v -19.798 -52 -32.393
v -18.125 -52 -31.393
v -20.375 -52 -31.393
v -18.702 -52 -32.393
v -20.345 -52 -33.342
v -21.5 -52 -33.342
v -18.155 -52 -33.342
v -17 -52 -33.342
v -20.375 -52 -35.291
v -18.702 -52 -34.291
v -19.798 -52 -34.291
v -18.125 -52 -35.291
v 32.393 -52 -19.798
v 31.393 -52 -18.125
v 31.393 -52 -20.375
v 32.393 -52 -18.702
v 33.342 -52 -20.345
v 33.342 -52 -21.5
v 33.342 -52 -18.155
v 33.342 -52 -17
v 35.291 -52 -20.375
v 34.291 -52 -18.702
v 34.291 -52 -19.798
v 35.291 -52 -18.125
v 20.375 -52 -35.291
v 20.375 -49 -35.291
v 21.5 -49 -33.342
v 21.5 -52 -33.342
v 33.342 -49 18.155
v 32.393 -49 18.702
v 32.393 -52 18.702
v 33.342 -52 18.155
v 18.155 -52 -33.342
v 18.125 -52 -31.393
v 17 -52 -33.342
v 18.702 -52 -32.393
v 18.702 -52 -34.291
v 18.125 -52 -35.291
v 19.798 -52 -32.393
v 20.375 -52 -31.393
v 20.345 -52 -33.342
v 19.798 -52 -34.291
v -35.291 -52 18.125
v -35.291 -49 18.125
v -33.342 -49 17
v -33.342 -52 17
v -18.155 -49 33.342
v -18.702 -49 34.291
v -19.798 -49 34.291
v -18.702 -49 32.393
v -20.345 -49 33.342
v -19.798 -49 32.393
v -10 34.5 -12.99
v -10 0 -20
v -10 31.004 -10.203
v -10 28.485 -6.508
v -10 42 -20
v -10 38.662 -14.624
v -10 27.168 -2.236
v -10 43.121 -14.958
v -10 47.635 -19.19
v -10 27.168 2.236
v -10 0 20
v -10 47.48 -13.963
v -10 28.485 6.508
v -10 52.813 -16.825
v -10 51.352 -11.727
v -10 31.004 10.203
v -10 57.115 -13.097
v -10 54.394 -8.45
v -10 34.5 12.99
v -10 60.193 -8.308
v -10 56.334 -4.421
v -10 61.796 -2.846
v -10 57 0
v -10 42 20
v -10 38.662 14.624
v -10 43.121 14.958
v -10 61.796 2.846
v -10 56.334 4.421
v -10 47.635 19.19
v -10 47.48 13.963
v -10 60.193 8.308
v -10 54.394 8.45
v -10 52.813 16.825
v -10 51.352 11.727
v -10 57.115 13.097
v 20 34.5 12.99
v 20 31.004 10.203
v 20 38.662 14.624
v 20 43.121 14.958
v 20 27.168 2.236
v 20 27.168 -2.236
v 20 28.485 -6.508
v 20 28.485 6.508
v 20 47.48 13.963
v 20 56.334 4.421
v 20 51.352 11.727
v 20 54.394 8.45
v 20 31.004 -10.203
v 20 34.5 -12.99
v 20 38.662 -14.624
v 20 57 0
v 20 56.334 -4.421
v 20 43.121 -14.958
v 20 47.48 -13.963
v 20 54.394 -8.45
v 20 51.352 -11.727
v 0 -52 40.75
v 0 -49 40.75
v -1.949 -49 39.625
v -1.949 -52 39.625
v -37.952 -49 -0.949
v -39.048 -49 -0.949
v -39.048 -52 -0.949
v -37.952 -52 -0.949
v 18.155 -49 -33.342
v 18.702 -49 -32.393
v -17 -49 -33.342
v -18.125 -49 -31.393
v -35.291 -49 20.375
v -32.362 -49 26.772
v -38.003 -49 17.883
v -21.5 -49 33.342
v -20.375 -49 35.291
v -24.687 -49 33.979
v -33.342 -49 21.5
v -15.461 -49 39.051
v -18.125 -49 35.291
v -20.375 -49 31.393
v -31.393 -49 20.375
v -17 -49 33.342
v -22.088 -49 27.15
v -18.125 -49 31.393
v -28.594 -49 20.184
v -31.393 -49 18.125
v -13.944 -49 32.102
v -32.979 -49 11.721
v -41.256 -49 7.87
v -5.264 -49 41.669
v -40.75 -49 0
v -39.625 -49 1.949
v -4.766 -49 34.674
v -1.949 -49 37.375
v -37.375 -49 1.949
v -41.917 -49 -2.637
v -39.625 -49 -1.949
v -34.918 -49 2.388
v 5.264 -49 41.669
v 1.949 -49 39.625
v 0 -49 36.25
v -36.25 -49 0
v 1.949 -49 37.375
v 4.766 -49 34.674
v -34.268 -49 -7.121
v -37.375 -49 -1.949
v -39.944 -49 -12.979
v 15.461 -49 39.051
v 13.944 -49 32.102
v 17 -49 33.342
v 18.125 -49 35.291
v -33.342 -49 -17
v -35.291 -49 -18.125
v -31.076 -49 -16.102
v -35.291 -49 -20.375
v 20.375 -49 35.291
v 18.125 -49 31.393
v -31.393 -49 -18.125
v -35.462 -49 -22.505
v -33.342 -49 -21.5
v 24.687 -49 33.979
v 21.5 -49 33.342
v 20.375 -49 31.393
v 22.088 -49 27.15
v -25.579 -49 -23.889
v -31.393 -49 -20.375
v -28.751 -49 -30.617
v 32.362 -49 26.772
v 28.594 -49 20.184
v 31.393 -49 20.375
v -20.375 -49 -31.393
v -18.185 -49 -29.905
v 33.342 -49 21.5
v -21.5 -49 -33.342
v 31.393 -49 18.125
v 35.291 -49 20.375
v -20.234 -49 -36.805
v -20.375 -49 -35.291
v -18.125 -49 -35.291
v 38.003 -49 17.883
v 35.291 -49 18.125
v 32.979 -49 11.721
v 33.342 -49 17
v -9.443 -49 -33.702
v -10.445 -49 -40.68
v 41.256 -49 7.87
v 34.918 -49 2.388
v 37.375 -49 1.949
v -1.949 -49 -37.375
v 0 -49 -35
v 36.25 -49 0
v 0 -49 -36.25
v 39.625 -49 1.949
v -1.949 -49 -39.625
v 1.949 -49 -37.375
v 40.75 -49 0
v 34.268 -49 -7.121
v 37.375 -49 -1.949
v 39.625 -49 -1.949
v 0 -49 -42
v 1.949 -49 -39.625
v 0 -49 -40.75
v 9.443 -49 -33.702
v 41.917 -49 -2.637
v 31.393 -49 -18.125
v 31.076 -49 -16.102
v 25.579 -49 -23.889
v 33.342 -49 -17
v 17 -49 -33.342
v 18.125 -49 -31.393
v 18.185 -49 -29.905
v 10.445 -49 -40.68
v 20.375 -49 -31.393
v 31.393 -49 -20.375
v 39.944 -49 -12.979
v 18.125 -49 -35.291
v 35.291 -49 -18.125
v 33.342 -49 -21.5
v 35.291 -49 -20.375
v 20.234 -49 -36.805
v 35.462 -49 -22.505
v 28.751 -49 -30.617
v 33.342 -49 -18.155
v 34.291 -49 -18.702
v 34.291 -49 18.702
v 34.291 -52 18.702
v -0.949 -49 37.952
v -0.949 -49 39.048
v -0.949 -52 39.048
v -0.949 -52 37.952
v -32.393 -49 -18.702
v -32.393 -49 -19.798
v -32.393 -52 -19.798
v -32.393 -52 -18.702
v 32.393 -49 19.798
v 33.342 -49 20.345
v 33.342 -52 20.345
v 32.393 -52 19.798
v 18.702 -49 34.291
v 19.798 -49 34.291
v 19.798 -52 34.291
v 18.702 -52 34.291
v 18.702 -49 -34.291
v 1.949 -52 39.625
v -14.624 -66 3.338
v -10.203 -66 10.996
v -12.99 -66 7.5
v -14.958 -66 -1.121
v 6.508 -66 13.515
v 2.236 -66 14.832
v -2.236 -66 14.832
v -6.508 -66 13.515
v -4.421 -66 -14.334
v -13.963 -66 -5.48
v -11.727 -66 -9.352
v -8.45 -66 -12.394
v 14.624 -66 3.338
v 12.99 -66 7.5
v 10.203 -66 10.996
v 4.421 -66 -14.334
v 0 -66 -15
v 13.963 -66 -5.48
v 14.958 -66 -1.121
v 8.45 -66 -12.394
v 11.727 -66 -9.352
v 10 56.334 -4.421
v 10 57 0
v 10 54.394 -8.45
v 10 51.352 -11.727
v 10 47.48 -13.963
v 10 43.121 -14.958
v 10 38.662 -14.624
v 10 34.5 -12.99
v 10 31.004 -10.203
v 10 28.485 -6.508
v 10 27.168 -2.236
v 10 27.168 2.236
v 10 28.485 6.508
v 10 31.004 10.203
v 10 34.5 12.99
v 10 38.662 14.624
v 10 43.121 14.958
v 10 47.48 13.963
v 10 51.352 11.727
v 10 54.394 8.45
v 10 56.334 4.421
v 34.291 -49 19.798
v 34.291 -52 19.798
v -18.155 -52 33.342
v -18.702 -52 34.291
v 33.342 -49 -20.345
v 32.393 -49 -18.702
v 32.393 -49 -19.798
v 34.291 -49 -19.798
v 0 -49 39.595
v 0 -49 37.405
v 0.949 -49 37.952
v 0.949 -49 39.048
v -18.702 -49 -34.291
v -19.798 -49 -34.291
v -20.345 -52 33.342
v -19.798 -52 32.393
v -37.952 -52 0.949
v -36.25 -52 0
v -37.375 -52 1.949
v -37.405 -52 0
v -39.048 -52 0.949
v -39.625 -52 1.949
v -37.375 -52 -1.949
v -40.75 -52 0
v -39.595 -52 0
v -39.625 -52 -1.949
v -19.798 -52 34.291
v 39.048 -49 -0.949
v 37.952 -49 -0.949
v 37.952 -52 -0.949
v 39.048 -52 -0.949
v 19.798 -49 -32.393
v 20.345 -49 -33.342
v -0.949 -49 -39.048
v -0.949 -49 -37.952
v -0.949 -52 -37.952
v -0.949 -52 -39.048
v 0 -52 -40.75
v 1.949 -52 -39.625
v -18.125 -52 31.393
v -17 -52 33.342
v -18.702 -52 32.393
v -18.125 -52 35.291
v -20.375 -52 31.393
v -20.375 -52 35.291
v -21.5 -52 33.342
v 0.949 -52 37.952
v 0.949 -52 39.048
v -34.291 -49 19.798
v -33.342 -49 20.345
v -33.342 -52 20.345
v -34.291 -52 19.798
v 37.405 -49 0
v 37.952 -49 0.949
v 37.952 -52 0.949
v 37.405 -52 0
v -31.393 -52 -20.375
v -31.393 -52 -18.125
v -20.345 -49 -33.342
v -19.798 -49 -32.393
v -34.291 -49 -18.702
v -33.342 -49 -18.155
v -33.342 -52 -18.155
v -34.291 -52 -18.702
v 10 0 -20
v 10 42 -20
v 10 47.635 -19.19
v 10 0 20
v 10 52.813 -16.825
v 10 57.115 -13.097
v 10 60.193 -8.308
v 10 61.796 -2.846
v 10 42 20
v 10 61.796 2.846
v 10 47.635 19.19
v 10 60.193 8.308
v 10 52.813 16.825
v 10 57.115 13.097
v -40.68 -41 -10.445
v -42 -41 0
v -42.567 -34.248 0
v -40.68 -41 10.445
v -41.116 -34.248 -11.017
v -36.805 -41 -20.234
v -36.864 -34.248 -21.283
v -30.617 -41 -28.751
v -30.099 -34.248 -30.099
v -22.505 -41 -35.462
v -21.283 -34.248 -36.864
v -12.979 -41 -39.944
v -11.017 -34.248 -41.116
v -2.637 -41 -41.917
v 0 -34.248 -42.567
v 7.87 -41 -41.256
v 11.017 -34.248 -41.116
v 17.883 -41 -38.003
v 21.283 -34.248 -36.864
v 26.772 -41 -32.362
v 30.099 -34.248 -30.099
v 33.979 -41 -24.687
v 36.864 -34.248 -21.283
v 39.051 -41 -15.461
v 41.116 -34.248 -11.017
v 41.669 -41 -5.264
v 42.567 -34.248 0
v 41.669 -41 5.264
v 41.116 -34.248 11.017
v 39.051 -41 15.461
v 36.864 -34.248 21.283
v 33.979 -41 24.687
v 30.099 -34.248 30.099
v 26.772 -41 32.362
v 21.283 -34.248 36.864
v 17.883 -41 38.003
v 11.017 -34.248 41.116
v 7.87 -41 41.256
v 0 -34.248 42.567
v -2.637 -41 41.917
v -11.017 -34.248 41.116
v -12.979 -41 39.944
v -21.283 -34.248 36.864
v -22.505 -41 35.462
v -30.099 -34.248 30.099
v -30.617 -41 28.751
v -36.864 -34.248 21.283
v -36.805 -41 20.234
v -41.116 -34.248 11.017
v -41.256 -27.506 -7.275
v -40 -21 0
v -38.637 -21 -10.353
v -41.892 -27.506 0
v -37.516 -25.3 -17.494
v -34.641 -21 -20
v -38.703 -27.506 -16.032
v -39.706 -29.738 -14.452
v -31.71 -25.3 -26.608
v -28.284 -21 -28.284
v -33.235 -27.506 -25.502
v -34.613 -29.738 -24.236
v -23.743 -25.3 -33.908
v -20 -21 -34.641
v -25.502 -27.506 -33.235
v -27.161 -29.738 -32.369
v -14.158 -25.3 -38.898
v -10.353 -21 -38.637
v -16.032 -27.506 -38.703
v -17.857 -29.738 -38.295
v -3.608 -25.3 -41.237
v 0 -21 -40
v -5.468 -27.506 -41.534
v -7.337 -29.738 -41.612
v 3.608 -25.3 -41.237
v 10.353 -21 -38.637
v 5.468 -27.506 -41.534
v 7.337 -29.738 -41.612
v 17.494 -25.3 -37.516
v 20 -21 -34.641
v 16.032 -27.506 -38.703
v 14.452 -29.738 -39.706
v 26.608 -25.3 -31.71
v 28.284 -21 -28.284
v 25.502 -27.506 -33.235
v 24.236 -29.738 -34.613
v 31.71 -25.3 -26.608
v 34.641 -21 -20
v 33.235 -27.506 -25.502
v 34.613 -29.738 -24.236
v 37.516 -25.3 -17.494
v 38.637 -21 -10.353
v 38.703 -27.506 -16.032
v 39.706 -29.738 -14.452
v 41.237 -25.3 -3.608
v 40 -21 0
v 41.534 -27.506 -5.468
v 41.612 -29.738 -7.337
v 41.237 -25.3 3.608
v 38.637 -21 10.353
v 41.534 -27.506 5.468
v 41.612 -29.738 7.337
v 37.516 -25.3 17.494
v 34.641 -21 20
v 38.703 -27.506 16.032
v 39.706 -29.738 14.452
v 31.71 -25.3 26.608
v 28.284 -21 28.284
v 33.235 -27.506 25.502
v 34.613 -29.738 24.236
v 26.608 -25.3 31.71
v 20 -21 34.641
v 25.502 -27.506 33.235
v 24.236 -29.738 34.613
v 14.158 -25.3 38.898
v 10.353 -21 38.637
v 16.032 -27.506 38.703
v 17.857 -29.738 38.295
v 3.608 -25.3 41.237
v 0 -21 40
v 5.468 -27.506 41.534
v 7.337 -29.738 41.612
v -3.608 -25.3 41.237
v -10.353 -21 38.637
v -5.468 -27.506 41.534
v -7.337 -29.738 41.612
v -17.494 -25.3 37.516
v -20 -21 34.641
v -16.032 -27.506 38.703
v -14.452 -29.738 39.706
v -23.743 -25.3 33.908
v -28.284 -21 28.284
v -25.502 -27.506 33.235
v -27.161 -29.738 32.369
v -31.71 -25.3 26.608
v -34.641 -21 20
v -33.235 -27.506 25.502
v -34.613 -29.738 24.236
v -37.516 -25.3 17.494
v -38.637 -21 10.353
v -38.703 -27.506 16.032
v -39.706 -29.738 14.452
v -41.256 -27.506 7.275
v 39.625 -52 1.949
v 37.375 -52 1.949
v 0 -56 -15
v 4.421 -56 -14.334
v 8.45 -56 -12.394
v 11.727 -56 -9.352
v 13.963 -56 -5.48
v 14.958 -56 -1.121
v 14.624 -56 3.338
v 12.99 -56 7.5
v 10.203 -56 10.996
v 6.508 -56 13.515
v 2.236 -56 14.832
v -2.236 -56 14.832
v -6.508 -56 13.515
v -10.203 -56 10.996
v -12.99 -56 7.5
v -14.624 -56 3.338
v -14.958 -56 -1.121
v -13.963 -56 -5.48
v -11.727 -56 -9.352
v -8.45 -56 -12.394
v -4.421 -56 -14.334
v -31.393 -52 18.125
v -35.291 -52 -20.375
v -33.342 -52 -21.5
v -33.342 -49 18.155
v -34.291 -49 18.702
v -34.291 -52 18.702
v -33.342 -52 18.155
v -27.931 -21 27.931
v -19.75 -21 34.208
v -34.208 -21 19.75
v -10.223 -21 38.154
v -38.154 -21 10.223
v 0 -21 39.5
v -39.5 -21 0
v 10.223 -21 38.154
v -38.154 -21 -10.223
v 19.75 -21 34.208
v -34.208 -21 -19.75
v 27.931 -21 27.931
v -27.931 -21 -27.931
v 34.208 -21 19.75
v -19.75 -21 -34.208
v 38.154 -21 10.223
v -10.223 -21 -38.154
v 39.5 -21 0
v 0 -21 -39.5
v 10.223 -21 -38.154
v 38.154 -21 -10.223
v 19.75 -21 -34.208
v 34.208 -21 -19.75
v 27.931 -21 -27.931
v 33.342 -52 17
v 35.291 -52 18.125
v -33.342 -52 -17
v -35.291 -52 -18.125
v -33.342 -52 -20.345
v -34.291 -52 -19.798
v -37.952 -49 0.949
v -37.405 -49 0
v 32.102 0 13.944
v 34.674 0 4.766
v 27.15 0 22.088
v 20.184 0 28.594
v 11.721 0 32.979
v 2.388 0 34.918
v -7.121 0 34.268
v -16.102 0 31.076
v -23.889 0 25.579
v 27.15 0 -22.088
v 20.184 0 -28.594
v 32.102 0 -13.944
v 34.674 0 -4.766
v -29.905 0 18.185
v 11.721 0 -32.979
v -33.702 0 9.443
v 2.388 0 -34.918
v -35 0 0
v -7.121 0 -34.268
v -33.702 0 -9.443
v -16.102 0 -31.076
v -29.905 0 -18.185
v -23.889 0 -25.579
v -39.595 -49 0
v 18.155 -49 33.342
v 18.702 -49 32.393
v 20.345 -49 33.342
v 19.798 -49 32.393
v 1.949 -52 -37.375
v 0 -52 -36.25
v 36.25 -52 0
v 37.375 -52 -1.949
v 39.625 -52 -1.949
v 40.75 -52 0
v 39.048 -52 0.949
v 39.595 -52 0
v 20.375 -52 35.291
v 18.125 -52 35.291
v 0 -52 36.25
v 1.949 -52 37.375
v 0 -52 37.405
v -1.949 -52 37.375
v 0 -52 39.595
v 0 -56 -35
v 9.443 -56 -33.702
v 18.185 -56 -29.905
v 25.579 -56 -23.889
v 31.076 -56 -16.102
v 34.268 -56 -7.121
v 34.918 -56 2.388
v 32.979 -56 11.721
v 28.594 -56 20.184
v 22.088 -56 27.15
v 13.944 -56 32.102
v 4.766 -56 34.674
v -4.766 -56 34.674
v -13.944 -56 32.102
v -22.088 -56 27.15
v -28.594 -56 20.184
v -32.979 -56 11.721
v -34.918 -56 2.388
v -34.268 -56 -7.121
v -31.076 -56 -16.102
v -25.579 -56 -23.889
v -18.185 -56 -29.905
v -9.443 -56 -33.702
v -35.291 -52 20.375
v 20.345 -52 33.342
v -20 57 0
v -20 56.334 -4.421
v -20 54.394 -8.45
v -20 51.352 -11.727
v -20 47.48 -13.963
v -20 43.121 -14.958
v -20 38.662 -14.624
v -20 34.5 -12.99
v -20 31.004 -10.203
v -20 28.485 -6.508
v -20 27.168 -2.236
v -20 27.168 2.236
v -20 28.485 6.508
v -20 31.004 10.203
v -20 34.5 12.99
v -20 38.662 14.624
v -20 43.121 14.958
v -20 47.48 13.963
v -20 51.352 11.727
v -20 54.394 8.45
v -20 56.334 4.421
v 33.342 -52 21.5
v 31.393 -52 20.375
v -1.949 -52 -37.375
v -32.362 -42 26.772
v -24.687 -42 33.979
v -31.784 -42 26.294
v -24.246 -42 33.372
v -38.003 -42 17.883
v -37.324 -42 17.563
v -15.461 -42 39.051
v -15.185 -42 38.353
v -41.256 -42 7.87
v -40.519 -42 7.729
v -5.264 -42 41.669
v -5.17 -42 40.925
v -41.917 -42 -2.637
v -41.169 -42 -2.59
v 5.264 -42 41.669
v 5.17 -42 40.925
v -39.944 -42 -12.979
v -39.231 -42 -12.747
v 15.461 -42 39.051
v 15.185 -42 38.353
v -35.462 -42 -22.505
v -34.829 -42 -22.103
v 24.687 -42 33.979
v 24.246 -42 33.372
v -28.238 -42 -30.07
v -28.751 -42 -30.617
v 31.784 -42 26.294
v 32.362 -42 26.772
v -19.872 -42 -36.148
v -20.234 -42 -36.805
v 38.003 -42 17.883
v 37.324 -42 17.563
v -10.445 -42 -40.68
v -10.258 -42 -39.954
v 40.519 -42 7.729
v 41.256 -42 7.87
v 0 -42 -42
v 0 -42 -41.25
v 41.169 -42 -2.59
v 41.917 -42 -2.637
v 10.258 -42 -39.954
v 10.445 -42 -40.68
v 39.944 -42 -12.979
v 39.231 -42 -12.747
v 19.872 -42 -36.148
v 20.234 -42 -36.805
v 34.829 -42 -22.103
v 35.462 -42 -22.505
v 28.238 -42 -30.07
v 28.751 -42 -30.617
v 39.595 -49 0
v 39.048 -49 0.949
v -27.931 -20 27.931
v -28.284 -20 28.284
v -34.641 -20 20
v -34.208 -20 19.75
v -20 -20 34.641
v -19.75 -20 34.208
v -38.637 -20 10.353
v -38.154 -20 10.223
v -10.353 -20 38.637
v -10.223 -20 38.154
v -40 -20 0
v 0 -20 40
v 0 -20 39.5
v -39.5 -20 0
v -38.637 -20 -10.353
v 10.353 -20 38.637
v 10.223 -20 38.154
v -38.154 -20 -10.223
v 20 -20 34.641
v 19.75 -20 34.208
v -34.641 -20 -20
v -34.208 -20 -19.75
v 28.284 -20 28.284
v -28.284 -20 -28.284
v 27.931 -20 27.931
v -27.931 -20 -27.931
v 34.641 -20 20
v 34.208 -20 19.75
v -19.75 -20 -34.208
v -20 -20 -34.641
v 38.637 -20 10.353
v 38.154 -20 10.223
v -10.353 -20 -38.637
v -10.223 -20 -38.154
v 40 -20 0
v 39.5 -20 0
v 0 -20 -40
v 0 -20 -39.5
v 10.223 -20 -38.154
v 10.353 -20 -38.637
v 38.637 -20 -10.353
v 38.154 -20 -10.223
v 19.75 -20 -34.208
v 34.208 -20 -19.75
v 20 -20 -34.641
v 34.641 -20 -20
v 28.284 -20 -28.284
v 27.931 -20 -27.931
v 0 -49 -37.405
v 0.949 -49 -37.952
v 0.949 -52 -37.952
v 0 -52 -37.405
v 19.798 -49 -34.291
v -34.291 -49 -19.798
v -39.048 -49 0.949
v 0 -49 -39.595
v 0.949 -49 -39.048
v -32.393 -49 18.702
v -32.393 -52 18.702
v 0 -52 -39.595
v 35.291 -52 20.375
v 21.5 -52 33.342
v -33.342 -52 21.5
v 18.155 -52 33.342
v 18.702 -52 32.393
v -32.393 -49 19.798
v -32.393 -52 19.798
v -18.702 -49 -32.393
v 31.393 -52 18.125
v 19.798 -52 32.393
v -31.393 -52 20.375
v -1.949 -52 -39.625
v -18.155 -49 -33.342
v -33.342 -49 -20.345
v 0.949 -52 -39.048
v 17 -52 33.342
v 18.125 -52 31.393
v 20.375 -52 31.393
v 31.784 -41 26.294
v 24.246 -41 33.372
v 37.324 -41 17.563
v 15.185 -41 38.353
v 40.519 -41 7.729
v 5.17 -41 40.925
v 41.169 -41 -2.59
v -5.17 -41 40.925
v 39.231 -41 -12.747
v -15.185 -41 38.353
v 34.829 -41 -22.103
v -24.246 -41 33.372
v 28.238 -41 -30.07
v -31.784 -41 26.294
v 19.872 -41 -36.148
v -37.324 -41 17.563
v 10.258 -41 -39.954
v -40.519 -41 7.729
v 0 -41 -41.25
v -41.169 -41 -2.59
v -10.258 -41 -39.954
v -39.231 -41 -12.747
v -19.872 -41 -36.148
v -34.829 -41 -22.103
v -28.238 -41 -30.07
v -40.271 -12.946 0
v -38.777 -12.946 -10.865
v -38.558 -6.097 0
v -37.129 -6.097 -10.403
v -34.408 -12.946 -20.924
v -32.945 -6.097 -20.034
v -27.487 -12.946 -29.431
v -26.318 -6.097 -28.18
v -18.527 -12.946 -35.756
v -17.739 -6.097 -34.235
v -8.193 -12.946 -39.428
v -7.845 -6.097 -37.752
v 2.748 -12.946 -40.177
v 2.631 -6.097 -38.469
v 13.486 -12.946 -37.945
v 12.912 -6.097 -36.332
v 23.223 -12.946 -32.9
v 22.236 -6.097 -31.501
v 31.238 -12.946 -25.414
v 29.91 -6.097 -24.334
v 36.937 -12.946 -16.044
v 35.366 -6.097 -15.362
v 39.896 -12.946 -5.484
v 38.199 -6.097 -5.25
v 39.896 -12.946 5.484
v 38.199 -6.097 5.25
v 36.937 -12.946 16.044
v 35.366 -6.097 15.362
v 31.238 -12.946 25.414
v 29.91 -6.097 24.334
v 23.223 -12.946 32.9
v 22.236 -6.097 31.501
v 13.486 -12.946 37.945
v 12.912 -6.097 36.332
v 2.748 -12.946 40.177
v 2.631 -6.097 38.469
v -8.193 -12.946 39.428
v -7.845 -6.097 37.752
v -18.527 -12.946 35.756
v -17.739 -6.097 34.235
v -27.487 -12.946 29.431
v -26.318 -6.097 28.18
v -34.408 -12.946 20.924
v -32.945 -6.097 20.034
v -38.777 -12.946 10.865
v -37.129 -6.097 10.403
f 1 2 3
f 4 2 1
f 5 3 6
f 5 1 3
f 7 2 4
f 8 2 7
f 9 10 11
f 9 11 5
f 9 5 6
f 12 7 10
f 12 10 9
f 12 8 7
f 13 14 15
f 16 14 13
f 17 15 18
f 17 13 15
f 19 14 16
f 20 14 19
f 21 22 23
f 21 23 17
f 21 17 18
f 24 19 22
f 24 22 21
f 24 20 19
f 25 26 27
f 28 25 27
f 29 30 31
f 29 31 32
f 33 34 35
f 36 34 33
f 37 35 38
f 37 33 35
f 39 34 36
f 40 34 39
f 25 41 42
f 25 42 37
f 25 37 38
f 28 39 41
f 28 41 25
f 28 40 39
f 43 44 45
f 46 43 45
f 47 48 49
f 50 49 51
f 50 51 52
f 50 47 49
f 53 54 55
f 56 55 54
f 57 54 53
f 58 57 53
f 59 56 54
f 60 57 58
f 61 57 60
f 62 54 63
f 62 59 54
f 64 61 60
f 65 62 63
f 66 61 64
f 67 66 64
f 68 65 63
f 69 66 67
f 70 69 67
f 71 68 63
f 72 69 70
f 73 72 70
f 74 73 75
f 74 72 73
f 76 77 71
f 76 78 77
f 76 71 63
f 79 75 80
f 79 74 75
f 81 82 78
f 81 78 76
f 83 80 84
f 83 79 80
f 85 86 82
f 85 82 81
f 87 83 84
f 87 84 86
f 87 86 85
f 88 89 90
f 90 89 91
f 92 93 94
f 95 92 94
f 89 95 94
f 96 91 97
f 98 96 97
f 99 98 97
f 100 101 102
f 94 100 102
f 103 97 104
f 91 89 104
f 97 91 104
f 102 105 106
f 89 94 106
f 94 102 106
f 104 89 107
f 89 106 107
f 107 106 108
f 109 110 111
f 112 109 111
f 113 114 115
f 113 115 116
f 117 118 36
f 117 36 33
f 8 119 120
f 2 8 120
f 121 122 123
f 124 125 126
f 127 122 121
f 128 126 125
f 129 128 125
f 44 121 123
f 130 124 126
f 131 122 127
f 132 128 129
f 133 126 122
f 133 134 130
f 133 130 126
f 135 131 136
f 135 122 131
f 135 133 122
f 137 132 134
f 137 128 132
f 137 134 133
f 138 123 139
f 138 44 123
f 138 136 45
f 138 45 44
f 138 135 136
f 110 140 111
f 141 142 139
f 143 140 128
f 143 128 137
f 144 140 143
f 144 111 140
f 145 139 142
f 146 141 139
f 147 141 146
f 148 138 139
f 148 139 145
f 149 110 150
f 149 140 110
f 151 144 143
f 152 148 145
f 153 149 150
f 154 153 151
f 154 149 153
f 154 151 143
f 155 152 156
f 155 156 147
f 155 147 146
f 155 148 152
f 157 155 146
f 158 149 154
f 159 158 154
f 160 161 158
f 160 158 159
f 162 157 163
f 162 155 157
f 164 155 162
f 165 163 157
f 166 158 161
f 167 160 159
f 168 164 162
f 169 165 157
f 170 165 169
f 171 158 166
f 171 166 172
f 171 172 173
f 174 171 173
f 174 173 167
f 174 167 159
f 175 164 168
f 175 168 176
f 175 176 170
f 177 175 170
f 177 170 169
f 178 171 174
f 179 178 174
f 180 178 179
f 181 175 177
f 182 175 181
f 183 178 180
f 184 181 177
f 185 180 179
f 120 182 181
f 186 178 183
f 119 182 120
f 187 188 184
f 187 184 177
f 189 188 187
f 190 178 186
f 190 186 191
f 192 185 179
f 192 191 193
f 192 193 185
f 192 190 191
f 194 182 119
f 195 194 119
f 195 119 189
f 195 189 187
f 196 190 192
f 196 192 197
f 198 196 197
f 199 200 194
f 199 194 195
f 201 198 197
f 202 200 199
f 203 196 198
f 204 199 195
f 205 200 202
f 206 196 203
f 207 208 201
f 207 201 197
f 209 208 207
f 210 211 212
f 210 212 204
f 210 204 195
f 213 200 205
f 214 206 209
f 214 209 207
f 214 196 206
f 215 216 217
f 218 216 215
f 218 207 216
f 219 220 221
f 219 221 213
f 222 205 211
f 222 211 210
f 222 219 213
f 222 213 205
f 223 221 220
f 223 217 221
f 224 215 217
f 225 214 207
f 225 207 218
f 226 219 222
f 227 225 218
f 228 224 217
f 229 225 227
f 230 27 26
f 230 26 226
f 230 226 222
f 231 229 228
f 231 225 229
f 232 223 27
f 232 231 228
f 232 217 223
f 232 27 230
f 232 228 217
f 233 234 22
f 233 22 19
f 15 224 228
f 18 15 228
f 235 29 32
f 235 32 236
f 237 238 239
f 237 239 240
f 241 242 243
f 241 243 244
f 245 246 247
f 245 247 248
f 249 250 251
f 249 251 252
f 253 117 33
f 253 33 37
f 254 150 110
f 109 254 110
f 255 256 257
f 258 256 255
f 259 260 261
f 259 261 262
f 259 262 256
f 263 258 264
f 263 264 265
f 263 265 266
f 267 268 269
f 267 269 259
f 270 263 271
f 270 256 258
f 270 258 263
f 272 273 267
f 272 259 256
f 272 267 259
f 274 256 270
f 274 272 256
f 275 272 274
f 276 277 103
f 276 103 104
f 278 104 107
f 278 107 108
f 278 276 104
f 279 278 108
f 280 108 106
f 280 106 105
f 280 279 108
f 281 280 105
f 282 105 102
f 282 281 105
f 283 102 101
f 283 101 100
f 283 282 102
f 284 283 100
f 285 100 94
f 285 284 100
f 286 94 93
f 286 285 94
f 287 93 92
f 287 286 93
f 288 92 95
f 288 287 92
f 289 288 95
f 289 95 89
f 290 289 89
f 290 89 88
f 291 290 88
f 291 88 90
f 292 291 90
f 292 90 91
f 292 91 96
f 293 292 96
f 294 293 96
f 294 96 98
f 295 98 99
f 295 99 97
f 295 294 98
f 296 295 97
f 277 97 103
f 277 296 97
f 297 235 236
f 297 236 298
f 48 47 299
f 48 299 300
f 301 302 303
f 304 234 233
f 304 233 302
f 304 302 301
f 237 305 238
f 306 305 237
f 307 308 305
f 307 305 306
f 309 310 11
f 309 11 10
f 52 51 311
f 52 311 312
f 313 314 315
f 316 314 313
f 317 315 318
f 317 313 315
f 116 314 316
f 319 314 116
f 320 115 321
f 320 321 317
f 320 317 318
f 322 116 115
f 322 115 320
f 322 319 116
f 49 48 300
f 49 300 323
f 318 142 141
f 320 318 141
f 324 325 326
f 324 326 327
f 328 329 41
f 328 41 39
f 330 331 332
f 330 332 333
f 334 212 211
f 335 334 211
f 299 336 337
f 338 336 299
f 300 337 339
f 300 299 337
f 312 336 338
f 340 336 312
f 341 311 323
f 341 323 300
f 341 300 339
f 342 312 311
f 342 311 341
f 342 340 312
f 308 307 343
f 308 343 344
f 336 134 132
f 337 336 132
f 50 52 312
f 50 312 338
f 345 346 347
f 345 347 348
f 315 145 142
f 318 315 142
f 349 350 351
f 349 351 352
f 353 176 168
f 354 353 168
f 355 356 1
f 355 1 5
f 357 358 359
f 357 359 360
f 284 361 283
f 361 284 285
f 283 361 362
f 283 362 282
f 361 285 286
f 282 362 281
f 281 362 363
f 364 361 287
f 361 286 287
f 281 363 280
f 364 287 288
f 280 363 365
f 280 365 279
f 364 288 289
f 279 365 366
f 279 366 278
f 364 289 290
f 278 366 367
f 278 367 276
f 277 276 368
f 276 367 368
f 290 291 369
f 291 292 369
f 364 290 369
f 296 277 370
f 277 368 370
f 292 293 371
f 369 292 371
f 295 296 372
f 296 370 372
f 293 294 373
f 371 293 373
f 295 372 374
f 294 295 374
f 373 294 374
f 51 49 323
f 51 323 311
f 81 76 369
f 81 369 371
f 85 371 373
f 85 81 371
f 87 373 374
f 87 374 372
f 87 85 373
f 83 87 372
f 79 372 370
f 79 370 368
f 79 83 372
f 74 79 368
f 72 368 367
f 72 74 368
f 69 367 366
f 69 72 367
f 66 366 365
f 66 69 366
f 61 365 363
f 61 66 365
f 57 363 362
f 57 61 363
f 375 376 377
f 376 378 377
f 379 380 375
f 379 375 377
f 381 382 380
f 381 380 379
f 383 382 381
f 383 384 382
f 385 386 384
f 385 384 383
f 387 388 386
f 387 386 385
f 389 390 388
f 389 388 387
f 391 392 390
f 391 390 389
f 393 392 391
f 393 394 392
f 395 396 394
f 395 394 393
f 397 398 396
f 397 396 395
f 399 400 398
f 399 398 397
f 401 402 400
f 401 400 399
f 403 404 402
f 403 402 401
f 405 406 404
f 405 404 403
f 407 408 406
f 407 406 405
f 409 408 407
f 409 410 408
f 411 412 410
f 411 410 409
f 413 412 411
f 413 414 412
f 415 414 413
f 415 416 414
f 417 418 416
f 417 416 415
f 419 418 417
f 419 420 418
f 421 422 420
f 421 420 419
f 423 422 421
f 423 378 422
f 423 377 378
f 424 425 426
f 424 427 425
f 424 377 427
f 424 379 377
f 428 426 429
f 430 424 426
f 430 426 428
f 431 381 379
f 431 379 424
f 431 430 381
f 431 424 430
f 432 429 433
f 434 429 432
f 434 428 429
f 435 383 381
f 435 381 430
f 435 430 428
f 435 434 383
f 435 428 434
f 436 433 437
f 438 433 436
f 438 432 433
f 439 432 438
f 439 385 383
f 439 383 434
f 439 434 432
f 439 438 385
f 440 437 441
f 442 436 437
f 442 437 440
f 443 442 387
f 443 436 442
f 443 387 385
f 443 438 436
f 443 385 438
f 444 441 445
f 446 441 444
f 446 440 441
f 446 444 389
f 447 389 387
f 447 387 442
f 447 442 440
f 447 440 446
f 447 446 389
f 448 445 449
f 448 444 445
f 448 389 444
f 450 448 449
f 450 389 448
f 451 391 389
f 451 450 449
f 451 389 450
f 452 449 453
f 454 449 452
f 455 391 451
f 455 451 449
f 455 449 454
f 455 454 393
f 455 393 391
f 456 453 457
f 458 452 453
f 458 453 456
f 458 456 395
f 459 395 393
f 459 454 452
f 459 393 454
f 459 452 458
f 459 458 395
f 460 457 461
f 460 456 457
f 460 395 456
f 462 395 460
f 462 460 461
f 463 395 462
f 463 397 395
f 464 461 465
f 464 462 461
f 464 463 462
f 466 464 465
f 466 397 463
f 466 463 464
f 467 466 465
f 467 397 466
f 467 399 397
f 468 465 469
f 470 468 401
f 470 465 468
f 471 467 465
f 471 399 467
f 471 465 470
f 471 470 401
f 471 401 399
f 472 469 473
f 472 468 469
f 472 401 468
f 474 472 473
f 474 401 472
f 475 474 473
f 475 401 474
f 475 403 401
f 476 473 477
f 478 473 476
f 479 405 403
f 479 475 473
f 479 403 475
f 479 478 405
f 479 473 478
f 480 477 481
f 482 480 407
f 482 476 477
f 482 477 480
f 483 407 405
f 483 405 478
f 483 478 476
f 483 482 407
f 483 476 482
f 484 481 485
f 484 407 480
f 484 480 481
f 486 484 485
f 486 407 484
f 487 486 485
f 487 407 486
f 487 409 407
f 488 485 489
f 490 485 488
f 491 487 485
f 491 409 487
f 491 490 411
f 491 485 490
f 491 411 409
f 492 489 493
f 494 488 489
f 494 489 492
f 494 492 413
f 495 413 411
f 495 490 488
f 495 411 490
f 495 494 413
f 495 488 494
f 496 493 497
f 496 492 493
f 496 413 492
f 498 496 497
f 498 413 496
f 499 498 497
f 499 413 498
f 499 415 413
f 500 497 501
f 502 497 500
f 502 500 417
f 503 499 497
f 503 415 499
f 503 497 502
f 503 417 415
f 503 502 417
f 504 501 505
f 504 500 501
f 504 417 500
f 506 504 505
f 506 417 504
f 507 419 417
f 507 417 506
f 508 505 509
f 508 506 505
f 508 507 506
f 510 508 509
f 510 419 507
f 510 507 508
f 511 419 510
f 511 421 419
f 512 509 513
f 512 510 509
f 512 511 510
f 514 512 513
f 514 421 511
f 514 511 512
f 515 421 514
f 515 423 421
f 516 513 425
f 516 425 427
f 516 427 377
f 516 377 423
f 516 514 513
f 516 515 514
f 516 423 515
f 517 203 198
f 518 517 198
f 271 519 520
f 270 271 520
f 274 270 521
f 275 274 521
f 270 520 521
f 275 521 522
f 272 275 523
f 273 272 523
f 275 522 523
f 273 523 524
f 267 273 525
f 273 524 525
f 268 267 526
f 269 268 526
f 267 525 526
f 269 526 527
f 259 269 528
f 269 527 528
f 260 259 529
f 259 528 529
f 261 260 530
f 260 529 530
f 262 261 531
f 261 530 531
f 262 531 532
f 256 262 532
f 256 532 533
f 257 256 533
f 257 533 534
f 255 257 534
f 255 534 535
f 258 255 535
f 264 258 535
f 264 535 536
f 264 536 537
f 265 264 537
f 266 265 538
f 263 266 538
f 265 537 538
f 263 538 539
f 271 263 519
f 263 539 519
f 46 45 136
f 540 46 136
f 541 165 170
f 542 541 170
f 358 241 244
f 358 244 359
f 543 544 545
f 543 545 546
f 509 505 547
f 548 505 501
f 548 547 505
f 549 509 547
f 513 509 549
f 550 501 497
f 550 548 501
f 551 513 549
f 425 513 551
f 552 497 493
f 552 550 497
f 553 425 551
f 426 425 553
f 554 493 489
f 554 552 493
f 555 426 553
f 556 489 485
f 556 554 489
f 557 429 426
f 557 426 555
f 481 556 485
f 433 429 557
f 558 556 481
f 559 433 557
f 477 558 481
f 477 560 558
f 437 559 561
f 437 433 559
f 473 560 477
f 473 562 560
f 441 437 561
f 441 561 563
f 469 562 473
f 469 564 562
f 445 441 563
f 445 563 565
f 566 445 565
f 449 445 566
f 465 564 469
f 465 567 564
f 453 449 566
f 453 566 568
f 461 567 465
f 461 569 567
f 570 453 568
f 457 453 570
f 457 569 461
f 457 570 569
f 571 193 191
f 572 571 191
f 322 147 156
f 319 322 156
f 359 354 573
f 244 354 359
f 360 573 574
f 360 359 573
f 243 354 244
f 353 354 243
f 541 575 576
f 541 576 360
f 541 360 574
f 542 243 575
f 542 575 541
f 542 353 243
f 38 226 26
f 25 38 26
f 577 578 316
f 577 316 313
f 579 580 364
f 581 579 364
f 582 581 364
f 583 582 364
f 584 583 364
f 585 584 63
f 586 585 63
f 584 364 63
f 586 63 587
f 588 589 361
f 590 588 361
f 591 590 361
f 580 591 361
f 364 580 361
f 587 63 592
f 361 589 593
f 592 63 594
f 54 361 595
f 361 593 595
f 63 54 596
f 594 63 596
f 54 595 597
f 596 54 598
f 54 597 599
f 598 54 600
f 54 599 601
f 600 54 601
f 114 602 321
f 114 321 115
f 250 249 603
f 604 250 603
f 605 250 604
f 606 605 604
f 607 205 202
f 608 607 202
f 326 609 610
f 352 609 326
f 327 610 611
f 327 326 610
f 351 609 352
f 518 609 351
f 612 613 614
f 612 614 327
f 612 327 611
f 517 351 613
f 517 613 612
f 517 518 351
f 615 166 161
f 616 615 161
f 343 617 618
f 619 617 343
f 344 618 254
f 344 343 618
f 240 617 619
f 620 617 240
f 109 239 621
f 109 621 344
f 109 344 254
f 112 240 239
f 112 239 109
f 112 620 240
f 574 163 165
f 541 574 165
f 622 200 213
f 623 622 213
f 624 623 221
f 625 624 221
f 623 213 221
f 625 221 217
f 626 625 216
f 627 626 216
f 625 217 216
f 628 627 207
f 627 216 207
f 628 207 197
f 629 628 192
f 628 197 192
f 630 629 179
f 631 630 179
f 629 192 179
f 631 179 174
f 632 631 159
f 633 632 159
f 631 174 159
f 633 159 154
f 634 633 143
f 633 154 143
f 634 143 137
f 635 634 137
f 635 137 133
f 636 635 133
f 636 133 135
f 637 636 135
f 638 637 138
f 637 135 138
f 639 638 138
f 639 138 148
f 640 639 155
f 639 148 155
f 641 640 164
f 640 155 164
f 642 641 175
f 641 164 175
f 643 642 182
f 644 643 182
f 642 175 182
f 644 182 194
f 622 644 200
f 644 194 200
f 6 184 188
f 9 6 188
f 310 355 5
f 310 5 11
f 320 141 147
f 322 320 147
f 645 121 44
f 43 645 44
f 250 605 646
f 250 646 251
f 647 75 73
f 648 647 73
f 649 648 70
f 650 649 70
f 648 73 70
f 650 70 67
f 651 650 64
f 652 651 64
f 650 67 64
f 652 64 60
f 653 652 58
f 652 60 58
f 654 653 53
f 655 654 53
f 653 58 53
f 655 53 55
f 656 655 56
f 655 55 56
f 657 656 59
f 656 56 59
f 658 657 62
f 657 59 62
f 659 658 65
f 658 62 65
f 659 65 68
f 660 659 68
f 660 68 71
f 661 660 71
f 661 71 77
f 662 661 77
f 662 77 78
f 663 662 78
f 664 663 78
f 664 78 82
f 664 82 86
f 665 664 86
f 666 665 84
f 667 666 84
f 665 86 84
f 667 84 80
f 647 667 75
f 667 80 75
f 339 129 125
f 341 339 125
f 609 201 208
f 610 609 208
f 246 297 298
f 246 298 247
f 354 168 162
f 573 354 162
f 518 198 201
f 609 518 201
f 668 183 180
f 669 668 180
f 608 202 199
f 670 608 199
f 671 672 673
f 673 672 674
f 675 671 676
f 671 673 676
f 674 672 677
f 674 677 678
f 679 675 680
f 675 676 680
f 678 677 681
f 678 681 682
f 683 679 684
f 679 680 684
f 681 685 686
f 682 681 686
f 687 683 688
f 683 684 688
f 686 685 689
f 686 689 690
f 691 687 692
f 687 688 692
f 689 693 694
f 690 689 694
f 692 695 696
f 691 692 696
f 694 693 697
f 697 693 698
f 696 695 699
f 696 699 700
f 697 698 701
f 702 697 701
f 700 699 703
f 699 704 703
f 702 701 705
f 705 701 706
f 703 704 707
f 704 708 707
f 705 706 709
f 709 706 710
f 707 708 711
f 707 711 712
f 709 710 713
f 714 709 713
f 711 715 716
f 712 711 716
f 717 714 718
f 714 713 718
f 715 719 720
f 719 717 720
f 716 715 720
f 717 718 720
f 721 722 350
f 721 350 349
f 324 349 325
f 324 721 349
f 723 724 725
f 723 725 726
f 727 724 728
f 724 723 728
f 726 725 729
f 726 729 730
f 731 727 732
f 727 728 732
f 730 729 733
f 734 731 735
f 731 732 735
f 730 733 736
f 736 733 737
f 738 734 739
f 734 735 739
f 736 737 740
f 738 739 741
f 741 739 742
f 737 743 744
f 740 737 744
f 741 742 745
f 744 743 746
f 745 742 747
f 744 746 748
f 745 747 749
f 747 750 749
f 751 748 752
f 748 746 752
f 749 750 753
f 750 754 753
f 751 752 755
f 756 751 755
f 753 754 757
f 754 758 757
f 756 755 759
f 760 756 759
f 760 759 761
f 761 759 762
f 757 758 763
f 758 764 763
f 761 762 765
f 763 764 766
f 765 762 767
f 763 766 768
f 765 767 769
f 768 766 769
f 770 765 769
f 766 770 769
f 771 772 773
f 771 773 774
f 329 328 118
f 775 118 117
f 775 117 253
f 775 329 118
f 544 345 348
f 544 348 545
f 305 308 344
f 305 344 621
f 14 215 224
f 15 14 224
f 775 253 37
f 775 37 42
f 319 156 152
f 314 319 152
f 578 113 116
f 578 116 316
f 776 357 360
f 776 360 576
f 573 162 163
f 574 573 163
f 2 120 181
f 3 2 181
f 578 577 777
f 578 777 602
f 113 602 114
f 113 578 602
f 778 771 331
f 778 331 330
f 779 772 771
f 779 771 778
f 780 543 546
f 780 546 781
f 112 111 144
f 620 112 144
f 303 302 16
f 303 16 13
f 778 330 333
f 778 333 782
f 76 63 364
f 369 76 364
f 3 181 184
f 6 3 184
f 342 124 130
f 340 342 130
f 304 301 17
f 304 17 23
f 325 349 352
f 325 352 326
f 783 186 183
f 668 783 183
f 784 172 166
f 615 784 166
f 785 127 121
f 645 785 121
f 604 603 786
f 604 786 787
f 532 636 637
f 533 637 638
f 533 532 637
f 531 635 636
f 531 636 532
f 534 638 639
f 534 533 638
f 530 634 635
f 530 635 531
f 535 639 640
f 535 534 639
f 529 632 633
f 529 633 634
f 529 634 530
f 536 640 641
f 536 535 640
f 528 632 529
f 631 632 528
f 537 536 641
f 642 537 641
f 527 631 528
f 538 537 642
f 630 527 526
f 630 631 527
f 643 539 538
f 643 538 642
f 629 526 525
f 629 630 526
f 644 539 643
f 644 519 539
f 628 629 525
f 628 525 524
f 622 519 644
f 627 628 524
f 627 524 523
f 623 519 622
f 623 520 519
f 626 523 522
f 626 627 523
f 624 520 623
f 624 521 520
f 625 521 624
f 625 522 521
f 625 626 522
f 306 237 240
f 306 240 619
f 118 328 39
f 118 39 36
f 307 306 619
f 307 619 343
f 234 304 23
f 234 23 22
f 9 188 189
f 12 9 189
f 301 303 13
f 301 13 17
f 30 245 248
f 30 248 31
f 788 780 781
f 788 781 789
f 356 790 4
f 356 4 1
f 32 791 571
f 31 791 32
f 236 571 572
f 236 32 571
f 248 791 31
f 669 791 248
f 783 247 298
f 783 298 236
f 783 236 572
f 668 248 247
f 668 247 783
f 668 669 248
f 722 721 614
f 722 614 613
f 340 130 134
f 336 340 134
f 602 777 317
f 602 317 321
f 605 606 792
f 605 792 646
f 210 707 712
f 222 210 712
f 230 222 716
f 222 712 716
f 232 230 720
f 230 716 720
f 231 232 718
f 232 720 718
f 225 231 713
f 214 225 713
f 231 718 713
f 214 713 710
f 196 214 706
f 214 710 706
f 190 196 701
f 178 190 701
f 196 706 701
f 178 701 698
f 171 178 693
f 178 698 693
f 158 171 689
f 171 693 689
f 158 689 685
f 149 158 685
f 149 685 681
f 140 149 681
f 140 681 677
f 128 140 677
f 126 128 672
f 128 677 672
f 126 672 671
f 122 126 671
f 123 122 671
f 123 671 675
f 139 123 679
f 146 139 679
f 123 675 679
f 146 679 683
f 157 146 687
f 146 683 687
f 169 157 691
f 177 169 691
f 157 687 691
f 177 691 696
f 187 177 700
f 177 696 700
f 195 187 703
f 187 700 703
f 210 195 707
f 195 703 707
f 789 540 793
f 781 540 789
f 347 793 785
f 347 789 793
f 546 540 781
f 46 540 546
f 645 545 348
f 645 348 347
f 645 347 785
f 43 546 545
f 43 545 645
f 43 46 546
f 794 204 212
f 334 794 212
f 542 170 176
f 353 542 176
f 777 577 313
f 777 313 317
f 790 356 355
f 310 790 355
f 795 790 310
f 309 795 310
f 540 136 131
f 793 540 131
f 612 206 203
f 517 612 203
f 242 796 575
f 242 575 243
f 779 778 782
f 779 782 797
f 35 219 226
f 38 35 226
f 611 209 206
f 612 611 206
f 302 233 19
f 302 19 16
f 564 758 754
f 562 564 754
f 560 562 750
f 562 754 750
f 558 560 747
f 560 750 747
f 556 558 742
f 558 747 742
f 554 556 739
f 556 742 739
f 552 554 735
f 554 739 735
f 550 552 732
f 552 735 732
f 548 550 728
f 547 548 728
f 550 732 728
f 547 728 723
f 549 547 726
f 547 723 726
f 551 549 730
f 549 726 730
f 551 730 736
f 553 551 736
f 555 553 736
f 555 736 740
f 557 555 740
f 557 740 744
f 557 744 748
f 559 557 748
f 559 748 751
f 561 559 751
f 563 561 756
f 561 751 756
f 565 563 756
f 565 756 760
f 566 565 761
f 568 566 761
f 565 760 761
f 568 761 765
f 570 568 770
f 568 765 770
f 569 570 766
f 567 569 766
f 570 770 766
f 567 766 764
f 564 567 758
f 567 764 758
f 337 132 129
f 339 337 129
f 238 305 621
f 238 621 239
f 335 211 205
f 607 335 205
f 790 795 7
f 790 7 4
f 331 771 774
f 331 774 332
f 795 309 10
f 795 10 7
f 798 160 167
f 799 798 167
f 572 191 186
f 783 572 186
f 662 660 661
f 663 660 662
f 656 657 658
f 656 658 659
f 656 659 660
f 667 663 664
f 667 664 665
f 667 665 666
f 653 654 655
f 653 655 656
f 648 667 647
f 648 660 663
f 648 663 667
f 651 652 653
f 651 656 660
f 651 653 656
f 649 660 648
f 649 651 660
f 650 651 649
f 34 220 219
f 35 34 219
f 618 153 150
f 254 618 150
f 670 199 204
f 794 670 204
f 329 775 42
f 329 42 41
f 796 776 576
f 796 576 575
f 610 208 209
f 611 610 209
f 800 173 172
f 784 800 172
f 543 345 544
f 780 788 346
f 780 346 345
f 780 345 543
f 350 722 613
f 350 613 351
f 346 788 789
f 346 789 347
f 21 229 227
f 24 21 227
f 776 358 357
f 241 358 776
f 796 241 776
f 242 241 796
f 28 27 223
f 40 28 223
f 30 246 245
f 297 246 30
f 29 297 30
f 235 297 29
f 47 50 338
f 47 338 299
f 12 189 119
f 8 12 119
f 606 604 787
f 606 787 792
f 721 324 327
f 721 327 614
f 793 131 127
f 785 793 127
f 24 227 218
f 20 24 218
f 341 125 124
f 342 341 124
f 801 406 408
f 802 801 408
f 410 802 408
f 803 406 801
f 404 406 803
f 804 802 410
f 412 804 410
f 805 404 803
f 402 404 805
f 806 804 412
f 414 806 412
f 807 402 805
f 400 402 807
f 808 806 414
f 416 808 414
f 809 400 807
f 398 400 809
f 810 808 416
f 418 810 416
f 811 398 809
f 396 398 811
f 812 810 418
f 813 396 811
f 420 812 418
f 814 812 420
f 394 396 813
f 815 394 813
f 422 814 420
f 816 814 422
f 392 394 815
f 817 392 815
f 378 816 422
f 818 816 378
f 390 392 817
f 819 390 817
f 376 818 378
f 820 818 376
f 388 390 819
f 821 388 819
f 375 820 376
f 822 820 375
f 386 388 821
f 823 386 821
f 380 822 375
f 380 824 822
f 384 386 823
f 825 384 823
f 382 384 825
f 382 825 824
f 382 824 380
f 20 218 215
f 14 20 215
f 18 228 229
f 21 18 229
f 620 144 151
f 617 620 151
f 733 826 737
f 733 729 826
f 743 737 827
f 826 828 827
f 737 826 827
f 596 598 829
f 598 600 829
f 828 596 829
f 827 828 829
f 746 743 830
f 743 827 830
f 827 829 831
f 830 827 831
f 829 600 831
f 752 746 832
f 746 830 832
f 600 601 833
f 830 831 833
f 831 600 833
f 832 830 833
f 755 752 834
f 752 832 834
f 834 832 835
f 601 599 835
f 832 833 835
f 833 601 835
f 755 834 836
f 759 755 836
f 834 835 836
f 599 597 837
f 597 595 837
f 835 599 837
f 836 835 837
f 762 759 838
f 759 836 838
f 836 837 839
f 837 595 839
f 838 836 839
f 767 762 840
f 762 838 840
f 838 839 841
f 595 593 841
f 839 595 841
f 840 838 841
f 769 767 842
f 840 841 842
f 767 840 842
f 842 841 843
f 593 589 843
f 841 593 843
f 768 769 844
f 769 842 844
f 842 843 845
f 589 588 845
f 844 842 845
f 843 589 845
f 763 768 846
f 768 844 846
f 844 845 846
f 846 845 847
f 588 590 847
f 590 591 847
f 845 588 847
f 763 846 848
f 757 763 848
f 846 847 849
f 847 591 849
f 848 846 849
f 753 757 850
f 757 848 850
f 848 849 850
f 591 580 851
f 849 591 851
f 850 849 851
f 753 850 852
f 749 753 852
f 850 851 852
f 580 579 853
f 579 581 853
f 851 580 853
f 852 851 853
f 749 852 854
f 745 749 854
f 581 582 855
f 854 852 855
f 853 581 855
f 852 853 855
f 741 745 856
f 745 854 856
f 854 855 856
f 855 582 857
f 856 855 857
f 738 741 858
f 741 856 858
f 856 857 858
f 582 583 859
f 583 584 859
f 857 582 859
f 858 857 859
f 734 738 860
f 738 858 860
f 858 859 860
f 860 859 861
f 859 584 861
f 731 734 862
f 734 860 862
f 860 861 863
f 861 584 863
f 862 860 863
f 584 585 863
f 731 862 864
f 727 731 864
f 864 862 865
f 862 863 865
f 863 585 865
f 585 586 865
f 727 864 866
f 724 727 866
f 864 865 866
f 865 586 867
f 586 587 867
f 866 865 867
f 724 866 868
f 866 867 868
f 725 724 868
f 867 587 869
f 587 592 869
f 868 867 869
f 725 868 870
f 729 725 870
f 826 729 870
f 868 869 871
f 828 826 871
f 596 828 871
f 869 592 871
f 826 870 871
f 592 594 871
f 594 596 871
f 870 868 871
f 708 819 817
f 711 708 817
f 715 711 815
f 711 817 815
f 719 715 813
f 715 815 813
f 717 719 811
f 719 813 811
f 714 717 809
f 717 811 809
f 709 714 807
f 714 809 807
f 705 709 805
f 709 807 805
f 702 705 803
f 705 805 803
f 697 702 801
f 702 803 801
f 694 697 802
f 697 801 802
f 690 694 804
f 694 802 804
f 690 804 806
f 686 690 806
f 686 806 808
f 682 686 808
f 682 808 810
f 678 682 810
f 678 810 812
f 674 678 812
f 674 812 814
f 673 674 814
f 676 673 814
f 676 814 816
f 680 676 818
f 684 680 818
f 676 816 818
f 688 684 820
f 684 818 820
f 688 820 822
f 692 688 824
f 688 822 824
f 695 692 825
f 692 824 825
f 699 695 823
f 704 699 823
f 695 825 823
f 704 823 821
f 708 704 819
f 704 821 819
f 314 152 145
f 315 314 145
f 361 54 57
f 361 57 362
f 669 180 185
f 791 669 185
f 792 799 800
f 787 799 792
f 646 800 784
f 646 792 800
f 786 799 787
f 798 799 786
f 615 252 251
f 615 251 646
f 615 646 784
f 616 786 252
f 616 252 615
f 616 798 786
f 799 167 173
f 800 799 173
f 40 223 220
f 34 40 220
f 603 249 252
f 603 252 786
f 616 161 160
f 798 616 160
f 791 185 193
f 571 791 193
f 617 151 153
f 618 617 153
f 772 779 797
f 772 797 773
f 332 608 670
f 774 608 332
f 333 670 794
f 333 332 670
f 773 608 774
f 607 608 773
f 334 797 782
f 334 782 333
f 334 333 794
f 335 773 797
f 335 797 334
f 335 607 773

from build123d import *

# Parameters (mm, degrees)
SKETCH2_R           = 39.5
BOSS_EXTRUDE1_DEPTH = 1
SKETCH4_R           = 41.25
BOSS_EXTRUDE2_DEPTH = 1
SKETCH5_R           = 42
BOSS_EXTRUDE3_DEPTH = 7
SKETCH6_R           = 35
BOSS_EXTRUDE4_DEPTH = 7
BOSS_EXTRUDE5_DEPTH = 3
CIRPATTERN1_COUNT   = 12
SKETCH8_R           = 15
BOSS_EXTRUDE6_DEPTH = 10
SKETCH9_W           = 20
SKETCH9_H           = 40
BOSS_EXTRUDE7_DEPTH = 42
BOSS_EXTRUDE8_DEPTH = 20
SKETCH11_R          = 15
BOSS_EXTRUDE9_DEPTH = 10


with BuildPart() as part:
    # Sketch1 → Revolve1 (revolve)
    with BuildSketch(Plane.XY):
        with BuildLine():
            Line((-35, 0), (0, 0))
            Line((0, 0), (0, -20))
            Line((0, -20), (-40, -20))
            ThreePointArc((-40, -20), (-39.657515479, -9.46062113), (-35, 0))
        make_face()
    revolve(axis=Axis((0, 0, 0), (0, -1, 0)))

    # Sketch2 → Boss-Extrude1 (add)
    with BuildSketch(Plane.XZ.offset(20)):
        Circle(SKETCH2_R)
    extrude(amount=BOSS_EXTRUDE1_DEPTH)

    # Sketch3 → Revolve2 (revolve)
    with BuildSketch(Plane(origin=(0, 0, 0), x_dir=(0, 0, -1), z_dir=(1, 0, 0)), mode=Mode.PRIVATE) as revolve2_sk:
        with BuildLine():
            Line((0, -21), (-40, -21))
            ThreePointArc((-40, -21), (-42.384109041, -30.861589096), (-42, -41))
            Line((-42, -41), (0, -41))
            Line((0, -41), (0, -21))
        make_face()
    revolve(revolve2_sk.sketch.rotate(Axis((0, -21, 0), (0, -1, 0)), 90), axis=Axis((0, -21, 0), (0, -1, 0)))

    # Sketch4 → Boss-Extrude2 (add)
    with BuildSketch(Plane.XZ.offset(41)):
        with Locations(Location((0, 0, 0), (0, 0, 270))):
            Circle(SKETCH4_R)
    extrude(amount=BOSS_EXTRUDE2_DEPTH)

    # Sketch5 → Boss-Extrude3 (add)
    with BuildSketch(Plane.XZ.offset(42)):
        with Locations(Location((0, 0, 0), (0, 0, 270))):
            Circle(SKETCH5_R)
    extrude(amount=BOSS_EXTRUDE3_DEPTH)

    # Sketch6 → Boss-Extrude4 (add)
    with BuildSketch(Plane.XZ.offset(49)):
        with Locations(Location((0, 0, 0), (0, 0, 270))):
            Circle(SKETCH6_R)
    extrude(amount=BOSS_EXTRUDE4_DEPTH)

    # Sketch7 → Boss-Extrude5 (add)
    with BuildSketch(Plane.XZ.offset(49)):
        Polygon((40.75, 0), (39.625, 1.948557159), (37.375, 1.948557159), (36.25, 0), (37.375, -1.948557159), (39.625, -1.948557159), align=None)
        Polygon((39.047649731, 0.948557159), (37.952350269, 0.948557159), (37.404700538, 0), (37.952350269, -0.948557159), (39.047649731, -0.948557159), (39.595299462, 0), align=None, mode=Mode.SUBTRACT)
    boss_extrude5 = extrude(amount=BOSS_EXTRUDE5_DEPTH)

    # CirPattern1: Boss-Extrude5 ×12 about axis
    cirpattern1_axis = Axis((0, 0, 0), (0, 1, 0))
    for i in range(1, CIRPATTERN1_COUNT):
        add(boss_extrude5.rotate(cirpattern1_axis, i * 360 / CIRPATTERN1_COUNT))

    # Sketch8 → Boss-Extrude6 (add)
    with BuildSketch(Plane.XZ.offset(56)):
        with Locations(Location((0, 0, 0), (0, 0, 270))):
            Circle(SKETCH8_R)
    extrude(amount=BOSS_EXTRUDE6_DEPTH)

    # Sketch9 → Boss-Extrude7 (add)
    with BuildSketch(Plane(origin=(0, 0, 0), x_dir=(1, 0, 0), z_dir=(0, 1, 0))):
        Rectangle(SKETCH9_W, SKETCH9_H)
    extrude(amount=BOSS_EXTRUDE7_DEPTH)

    # Sketch10 → Boss-Extrude8 (add)
    with BuildSketch(Plane.ZY.offset(10)):
        with BuildLine():
            Line((-20, 42), (20, 42))
            ThreePointArc((20, 42), (0, 62), (-20, 42))
        make_face()
    extrude(amount=-BOSS_EXTRUDE8_DEPTH)

    # Sketch11 → Boss-Extrude9 (add)
    with BuildSketch(Plane.ZY.offset(10)):
        with Locations(Location((0, 42, 0), (0, 0, 90))):
            Circle(SKETCH11_R)
    boss_extrude9 = extrude(amount=BOSS_EXTRUDE9_DEPTH)

    # Mirror1: Boss-Extrude9 across plane
    add(boss_extrude9.mirror(Plane(origin=(0, 0, 0), x_dir=(0, 0, 1), z_dir=(1, 0, 0))))


solid = part.part
